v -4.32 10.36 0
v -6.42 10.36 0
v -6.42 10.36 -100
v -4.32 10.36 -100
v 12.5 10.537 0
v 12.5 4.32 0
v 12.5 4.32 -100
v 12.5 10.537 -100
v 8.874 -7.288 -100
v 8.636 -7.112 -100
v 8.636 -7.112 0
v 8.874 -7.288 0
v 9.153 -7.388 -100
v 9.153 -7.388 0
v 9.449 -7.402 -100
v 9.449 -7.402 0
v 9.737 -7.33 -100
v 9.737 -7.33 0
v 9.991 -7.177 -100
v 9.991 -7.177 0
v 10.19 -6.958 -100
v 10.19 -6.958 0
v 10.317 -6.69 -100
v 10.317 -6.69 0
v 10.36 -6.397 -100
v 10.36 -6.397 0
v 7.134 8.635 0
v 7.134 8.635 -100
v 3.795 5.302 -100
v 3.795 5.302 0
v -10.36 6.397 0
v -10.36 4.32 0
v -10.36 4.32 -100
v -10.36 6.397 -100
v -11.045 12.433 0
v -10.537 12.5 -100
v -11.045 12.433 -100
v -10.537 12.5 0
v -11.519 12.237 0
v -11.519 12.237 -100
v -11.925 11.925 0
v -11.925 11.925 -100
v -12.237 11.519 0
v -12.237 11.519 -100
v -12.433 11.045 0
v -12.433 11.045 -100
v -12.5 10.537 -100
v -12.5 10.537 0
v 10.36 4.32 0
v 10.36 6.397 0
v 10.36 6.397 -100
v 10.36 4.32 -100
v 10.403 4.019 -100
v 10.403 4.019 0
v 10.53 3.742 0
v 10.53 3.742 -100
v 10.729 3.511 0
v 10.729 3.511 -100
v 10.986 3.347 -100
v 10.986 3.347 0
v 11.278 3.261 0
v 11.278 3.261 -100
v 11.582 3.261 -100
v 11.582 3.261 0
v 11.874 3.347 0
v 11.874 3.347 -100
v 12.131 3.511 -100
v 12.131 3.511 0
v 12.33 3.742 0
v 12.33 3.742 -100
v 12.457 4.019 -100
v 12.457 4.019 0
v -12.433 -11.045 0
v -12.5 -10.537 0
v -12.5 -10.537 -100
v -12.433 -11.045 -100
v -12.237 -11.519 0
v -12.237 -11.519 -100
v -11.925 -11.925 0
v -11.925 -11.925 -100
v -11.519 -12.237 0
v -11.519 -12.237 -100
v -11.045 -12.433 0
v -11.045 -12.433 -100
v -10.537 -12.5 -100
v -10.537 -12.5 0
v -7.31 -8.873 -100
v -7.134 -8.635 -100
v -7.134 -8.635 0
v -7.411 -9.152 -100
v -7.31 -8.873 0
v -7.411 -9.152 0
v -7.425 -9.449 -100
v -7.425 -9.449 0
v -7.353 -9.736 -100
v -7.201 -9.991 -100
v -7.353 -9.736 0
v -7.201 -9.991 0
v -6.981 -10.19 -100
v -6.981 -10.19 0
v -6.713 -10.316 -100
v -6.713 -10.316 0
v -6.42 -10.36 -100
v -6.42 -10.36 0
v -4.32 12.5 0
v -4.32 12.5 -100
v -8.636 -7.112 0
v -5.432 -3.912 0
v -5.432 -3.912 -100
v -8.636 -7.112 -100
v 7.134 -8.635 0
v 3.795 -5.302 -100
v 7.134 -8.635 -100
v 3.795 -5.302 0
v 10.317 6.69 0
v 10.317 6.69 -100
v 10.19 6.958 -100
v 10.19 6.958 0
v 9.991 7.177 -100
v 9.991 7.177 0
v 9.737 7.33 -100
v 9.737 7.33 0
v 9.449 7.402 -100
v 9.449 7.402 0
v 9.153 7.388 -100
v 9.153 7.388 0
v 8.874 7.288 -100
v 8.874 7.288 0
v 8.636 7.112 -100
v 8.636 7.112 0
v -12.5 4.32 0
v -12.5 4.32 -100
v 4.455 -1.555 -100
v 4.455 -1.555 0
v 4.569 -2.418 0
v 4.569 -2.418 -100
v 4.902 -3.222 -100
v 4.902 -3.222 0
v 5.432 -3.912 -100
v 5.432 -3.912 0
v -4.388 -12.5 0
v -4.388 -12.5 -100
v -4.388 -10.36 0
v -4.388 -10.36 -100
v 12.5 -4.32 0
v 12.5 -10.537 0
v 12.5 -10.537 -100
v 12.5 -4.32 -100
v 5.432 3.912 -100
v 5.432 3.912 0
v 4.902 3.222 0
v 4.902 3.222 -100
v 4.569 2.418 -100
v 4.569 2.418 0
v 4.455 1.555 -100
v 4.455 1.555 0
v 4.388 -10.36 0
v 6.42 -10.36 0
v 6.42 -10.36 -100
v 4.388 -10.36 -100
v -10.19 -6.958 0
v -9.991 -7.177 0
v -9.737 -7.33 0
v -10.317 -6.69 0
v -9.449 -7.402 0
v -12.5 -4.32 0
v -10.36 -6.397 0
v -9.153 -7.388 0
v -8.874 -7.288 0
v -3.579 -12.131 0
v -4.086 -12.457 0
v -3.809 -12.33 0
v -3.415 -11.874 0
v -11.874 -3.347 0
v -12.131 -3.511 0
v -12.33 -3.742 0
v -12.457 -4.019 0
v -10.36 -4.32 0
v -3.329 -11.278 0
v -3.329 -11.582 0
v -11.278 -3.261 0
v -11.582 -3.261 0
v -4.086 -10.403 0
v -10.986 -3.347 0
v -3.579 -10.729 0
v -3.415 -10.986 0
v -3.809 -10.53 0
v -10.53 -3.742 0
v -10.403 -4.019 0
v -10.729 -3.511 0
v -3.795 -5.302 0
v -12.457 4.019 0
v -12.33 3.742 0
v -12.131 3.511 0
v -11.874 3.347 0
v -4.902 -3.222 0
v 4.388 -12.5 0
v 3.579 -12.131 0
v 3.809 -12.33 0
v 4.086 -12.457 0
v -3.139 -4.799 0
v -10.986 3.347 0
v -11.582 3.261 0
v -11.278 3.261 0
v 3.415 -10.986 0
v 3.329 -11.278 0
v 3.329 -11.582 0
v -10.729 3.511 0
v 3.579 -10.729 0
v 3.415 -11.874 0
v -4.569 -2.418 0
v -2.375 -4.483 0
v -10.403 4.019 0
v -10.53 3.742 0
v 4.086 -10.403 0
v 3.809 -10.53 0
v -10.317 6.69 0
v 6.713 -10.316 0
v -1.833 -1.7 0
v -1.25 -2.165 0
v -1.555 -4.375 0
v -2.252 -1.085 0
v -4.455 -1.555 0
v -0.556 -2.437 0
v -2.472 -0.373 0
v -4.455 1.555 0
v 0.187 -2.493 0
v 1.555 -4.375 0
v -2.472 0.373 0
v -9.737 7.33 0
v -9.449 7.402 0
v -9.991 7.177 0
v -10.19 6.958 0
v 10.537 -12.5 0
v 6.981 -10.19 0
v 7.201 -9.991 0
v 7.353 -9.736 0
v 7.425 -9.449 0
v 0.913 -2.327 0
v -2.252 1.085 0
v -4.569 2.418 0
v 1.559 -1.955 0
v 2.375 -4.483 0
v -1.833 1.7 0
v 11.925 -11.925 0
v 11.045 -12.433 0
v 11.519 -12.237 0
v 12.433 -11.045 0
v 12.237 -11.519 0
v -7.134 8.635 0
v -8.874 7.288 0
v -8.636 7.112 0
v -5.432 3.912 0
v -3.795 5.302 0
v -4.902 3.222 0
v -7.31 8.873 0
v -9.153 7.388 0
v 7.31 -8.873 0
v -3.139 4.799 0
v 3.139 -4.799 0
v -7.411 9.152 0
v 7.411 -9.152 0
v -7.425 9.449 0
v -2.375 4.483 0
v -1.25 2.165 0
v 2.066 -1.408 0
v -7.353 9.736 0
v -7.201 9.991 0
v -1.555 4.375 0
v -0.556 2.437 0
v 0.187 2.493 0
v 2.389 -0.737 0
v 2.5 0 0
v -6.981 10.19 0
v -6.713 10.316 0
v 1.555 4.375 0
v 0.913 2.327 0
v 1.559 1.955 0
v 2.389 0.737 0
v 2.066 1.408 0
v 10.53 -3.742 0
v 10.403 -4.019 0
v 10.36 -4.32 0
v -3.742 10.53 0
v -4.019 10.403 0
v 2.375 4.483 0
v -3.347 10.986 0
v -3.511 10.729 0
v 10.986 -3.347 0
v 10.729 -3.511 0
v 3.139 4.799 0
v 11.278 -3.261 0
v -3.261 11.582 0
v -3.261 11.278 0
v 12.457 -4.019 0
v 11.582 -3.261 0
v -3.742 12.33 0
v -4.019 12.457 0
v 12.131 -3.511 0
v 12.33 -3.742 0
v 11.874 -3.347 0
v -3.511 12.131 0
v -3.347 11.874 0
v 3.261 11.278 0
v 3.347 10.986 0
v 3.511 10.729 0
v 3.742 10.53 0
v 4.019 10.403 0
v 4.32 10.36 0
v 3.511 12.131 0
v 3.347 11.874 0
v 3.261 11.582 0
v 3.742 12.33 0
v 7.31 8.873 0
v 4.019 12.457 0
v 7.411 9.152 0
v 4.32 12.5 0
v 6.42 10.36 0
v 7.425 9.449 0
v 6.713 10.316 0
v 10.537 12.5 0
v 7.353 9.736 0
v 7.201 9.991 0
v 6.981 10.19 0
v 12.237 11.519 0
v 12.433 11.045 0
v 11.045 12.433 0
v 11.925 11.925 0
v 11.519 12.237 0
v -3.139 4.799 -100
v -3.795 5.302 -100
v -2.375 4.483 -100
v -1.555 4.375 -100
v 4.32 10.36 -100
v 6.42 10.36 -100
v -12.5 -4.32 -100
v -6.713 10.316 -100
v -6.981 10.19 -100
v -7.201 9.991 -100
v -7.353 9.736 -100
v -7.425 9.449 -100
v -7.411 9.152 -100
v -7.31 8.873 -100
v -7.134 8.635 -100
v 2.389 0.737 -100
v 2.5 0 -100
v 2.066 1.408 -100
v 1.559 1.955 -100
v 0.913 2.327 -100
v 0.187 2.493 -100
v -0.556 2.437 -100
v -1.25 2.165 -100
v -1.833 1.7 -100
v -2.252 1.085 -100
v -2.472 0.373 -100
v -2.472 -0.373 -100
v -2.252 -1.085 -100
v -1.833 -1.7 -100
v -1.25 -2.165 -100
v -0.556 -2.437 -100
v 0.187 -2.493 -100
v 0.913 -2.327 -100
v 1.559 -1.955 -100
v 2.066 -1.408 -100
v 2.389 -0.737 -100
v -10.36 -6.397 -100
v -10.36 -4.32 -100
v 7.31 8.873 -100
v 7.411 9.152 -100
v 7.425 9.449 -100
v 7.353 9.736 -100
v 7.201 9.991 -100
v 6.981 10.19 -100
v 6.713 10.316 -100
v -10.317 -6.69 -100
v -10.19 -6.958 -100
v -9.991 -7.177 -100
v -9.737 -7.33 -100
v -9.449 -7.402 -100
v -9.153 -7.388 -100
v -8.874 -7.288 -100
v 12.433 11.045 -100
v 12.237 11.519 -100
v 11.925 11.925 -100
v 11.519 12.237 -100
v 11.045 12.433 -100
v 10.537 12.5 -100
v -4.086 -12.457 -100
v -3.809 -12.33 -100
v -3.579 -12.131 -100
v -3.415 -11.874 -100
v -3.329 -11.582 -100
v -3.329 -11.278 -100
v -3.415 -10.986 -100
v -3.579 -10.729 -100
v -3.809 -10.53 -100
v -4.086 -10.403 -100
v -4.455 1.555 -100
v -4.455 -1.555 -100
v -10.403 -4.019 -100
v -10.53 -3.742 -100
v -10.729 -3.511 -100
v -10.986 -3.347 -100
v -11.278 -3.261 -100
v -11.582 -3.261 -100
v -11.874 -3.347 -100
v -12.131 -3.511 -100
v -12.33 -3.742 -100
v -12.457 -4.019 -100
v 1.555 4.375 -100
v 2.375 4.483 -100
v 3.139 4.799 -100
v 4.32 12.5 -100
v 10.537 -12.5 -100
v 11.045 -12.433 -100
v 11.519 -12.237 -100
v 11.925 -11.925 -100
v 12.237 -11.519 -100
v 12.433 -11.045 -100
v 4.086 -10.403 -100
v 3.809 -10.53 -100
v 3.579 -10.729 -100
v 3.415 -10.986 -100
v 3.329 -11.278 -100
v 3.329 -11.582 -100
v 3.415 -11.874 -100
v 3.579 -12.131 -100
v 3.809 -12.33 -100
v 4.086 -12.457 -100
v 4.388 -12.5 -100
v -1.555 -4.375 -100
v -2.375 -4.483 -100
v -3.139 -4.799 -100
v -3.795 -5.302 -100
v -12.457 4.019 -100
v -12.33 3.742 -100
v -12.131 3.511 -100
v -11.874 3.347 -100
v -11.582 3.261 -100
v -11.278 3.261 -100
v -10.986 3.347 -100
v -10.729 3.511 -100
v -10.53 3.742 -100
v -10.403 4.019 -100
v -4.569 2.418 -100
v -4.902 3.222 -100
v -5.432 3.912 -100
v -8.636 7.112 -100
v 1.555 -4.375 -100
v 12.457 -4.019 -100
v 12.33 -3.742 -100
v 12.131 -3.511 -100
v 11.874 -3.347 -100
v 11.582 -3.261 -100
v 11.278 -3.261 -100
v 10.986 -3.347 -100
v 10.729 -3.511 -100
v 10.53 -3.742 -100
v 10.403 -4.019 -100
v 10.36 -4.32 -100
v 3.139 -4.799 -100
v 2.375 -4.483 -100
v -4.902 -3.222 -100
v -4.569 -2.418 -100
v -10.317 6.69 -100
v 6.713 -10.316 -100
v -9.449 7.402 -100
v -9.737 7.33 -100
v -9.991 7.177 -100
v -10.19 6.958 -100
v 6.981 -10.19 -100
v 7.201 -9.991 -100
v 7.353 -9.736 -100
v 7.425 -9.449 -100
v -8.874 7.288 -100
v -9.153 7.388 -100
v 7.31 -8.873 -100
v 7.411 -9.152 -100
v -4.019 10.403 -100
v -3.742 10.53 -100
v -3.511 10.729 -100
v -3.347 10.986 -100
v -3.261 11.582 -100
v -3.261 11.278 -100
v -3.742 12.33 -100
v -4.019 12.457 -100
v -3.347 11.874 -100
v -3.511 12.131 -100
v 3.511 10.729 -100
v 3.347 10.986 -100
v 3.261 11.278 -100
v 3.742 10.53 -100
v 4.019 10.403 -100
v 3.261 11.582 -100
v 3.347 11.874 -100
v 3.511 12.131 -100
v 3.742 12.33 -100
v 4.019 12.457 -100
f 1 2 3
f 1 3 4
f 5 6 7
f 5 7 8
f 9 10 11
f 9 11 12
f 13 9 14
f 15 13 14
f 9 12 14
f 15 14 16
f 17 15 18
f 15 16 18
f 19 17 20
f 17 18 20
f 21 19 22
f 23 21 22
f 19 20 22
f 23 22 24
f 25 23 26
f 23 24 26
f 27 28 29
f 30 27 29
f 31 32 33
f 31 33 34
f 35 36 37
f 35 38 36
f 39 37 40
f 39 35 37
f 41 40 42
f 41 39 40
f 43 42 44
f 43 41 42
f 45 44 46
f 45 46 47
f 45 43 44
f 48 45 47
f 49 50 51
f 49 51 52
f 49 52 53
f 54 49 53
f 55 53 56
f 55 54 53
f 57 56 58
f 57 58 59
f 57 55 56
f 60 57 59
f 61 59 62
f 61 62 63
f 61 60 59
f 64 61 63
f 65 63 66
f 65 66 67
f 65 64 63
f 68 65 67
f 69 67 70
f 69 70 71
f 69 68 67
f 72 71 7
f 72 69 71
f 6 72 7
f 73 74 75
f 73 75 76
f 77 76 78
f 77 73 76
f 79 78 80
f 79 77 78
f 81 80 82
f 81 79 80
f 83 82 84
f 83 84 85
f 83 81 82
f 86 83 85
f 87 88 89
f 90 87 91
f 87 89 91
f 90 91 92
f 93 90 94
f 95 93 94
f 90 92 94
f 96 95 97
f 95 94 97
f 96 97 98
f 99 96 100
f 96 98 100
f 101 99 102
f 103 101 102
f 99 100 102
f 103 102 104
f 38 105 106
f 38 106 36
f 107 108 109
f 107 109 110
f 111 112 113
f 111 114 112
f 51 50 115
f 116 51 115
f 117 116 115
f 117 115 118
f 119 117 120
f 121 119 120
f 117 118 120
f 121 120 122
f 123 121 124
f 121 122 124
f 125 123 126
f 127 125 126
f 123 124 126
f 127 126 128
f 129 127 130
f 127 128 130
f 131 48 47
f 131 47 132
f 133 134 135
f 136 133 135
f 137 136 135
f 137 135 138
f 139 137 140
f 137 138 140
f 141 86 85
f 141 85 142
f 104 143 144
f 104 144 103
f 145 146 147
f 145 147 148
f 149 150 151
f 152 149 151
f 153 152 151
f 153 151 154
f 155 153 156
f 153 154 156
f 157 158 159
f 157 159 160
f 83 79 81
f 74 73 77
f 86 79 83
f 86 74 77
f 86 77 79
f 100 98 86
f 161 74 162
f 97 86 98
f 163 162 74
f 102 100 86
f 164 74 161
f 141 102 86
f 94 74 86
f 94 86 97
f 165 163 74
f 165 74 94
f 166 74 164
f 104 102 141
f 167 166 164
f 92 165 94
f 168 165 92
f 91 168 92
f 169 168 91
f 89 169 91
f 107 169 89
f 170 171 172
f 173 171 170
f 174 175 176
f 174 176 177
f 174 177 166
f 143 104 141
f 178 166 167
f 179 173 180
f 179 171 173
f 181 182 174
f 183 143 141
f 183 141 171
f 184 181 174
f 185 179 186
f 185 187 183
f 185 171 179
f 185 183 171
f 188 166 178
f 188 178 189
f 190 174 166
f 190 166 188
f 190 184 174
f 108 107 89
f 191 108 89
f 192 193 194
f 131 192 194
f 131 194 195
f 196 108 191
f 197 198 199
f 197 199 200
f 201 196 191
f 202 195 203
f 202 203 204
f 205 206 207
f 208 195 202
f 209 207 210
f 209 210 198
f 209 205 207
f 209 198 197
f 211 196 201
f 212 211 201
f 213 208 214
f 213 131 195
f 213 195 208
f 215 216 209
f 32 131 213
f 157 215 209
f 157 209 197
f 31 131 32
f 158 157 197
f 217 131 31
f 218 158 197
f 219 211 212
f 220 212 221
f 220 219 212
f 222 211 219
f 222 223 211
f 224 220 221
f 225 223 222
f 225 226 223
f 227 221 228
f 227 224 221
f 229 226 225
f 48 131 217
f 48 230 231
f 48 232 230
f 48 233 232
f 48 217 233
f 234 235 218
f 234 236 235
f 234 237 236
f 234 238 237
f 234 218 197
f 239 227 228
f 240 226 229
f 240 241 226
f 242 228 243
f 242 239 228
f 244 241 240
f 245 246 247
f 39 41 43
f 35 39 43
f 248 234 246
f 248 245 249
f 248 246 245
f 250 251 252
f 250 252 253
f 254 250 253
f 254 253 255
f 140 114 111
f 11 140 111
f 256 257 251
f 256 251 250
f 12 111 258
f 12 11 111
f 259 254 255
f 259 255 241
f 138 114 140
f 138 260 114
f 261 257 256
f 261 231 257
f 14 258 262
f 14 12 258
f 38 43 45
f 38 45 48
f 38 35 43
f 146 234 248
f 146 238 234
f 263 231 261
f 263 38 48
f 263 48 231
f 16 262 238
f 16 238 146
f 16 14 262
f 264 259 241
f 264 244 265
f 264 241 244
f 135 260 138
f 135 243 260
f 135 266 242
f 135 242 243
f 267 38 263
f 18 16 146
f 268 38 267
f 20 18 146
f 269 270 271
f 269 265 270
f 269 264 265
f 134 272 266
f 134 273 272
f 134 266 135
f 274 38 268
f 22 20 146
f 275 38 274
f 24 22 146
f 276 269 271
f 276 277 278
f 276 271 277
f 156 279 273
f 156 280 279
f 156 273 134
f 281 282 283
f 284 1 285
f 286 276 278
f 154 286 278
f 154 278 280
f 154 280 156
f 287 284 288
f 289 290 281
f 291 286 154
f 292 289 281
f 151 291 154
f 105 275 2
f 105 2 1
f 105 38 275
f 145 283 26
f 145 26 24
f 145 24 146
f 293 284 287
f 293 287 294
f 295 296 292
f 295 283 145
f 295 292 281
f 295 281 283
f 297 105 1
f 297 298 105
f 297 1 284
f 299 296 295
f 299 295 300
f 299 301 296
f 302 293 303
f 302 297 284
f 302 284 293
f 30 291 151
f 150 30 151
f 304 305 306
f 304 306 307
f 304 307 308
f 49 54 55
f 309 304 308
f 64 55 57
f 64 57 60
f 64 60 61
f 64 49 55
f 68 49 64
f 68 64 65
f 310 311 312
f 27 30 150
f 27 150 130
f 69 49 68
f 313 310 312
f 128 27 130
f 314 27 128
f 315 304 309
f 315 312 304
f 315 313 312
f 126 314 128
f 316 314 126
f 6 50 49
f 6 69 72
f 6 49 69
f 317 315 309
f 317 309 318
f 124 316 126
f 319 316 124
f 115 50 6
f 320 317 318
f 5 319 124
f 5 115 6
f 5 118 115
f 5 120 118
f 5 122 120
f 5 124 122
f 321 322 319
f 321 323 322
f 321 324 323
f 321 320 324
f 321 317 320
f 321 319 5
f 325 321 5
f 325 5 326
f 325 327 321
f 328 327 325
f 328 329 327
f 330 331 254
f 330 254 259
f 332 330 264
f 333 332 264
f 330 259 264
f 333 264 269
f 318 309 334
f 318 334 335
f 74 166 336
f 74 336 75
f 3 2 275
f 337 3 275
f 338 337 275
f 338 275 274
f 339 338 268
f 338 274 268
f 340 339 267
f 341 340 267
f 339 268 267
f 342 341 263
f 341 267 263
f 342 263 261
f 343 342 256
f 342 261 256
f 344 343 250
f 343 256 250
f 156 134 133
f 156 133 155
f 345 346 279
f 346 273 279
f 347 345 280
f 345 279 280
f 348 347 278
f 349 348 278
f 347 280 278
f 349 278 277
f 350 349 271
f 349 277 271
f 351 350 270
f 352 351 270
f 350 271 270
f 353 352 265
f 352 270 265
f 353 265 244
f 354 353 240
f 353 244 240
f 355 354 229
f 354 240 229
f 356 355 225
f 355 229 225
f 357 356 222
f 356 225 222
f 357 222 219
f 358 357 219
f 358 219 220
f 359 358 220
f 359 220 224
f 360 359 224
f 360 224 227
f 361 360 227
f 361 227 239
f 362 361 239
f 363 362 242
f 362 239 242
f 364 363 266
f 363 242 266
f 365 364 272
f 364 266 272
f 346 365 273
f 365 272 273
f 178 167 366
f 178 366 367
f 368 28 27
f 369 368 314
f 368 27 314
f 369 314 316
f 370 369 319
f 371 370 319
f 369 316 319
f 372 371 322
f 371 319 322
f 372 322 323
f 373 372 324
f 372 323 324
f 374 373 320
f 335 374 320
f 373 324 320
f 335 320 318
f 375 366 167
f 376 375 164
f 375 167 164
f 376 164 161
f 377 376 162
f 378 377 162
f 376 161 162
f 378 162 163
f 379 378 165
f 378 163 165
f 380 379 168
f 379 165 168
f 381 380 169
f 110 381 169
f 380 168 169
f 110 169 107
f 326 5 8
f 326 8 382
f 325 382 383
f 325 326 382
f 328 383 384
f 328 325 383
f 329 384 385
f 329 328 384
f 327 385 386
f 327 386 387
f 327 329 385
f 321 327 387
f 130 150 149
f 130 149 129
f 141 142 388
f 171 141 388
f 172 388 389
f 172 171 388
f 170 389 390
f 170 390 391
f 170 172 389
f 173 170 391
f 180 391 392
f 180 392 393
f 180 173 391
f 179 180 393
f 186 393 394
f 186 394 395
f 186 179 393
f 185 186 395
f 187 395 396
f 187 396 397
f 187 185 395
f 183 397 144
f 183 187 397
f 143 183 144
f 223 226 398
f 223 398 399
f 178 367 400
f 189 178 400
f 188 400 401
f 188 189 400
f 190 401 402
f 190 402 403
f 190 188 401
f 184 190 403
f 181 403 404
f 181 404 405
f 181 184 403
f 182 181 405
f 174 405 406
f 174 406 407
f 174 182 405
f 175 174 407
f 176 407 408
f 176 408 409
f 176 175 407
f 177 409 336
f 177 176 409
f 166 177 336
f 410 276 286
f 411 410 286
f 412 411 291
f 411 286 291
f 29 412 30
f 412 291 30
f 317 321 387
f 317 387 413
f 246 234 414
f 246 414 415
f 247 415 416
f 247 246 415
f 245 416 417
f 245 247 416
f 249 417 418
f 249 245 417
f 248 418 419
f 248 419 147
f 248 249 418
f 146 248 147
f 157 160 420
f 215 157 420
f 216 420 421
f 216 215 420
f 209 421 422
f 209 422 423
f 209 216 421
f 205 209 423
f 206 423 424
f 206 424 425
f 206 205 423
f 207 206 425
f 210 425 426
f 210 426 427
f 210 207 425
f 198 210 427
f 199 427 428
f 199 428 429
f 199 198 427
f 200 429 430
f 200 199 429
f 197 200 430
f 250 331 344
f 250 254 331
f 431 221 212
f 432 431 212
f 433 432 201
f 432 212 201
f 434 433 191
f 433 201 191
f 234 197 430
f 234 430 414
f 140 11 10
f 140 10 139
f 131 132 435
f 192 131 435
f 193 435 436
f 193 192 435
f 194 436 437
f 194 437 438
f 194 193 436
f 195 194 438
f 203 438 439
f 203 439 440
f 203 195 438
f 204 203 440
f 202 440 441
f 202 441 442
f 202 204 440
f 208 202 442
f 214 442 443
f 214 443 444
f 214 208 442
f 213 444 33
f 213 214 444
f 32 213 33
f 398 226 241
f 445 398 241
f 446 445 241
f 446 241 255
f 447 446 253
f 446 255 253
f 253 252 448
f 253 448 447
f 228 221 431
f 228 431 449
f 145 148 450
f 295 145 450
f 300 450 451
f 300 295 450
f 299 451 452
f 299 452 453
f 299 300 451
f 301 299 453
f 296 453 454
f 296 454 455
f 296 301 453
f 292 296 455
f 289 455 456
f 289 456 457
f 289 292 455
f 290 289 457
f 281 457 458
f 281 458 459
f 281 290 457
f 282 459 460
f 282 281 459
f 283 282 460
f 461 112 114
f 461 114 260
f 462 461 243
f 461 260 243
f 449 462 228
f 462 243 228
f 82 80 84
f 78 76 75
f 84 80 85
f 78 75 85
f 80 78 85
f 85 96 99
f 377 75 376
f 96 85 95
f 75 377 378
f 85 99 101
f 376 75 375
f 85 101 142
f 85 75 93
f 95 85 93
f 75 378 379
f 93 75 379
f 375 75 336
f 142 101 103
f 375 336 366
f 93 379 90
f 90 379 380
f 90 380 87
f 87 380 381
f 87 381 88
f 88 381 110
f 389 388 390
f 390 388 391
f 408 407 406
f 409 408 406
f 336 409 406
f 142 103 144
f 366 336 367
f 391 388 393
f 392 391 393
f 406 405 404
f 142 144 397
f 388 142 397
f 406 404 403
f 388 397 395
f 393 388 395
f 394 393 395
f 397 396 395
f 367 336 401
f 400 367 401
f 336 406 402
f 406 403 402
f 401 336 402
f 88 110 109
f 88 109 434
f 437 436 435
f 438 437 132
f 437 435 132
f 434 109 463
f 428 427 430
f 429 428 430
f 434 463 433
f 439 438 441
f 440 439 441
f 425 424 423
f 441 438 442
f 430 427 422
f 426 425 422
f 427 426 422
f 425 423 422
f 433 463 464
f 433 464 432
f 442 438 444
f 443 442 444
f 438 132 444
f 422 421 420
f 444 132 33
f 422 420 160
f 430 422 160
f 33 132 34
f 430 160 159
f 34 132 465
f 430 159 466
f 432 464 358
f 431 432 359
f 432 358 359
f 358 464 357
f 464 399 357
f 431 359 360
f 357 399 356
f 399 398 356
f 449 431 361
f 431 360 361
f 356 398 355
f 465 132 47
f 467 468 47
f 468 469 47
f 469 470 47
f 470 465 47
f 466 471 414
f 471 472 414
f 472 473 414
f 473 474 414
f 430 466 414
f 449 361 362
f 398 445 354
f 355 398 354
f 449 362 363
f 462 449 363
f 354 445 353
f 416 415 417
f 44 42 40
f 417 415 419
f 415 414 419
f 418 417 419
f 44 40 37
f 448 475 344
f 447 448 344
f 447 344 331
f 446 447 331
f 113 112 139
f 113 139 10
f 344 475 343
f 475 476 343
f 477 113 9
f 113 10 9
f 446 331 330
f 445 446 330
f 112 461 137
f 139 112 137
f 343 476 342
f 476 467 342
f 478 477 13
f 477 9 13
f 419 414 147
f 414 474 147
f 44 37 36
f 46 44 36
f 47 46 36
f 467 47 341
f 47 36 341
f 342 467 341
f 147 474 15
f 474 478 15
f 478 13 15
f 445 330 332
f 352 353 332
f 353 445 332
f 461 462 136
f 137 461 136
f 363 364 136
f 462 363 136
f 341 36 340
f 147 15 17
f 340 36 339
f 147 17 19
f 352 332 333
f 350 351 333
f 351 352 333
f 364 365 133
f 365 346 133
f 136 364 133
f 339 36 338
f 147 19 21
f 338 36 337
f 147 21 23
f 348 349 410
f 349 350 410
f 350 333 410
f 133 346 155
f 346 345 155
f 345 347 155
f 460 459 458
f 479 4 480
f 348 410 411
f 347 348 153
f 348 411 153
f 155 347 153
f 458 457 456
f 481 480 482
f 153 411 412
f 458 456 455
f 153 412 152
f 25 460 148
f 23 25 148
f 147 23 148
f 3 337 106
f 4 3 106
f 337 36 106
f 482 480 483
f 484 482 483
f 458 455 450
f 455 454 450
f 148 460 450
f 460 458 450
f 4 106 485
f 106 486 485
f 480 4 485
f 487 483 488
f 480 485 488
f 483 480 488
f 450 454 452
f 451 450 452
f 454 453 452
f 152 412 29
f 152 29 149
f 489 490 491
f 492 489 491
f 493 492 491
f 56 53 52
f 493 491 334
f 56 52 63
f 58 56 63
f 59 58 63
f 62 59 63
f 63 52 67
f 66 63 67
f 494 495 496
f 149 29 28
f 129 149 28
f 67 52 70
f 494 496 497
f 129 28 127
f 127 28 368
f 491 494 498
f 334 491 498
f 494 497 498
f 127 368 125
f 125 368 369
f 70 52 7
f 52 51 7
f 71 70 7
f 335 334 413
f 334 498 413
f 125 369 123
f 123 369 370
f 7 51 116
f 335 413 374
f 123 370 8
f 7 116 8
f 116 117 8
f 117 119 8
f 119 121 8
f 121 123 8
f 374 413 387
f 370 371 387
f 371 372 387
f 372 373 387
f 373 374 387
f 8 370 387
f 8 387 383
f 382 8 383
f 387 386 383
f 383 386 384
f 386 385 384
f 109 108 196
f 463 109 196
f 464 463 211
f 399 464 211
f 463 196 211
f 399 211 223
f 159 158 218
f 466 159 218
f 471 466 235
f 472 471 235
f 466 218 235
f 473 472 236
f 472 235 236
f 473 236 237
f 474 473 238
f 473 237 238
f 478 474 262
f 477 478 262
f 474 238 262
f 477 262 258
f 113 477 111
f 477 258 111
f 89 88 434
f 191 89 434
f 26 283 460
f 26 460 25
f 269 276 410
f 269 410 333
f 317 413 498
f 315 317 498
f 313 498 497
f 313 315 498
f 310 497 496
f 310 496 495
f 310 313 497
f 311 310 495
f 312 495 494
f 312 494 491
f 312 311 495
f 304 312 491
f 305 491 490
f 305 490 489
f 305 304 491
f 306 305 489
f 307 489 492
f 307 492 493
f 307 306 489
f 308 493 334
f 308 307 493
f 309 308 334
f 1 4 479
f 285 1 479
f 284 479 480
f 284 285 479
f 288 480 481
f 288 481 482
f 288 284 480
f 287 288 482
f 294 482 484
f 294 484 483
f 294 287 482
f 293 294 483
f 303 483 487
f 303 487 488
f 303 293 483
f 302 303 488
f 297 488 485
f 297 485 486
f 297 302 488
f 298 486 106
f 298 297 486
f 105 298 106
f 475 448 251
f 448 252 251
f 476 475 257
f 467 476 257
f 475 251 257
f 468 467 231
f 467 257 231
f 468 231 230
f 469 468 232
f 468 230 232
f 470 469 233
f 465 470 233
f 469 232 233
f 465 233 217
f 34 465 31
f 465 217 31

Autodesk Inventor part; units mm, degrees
ref_plane "YZ Plane" through (0, 0, 0) normal (1, 0, 0) x (0, 1, 0)
ref_plane "XZ Plane" through (0, 0, 0) normal (0, 1, 0) x (-1, 0, 0)
ref_plane "XY Plane" through (0, 0, 0) normal (0, 0, 1) x (1, 0, 0)
sketch "Sketch1" plane through (0, 0, 0) normal (0, 0, 1) x (1, 0, 0)
  circle A0 centre (0, 0) radius 2.5
  arc A1 (-8.6363, 7.1116) -> (-10.36, 6.3969) centre (-9.35, 6.3969) ccw
  line L0 (-8.6363, 7.1116) -> (-5.4322, 3.9121)
  arc A2 (-4.455, 1.5554) -> (-5.4322, 3.9121) centre (-7.7855, 1.5554) ccw
  line L1 (-4.455, 1.5554) -> (-4.455, -1.5554)
  arc A3 (-5.4322, -3.9121) -> (-4.455, -1.5554) centre (-7.7855, -1.5554) ccw
  line L2 (-5.4322, -3.9121) -> (-8.6363, -7.1116)
  arc A4 (-10.36, -6.3969) -> (-8.6363, -7.1116) centre (-9.35, -6.3969) ccw
  line L3 (-10.36, -6.3969) -> (-10.36, -4.32)
  arc A5 (-10.36, -4.32) -> (-12.5, -4.32) centre (-11.43, -4.32) ccw
  line L4 (-12.5, -4.32) -> (-12.5, -10.5371)
  arc A6 (-12.5, -10.5371) -> (-10.5371, -12.5) centre (-10.5371, -10.5371) ccw
  line L5 (-10.5371, -12.5) -> (-4.3879, -12.5)
  arc A7 (-4.3879, -12.5) -> (-4.3879, -10.36) centre (-4.3879, -11.43) ccw
  line L6 (-4.3879, -10.36) -> (-6.42, -10.36)
  arc A8 (-7.1337, -8.6353) -> (-6.42, -10.36) centre (-6.42, -9.35) ccw
  line L7 (-7.1337, -8.6353) -> (-3.7953, -5.3018)
  arc A9 (-1.5554, -4.375) -> (-3.7953, -5.3018) centre (-1.5554, -7.545) ccw
  line L8 (-1.5554, -4.375) -> (1.5554, -4.375)
  arc A10 (3.7953, -5.3018) -> (1.5554, -4.375) centre (1.5554, -7.545) ccw
  line L9 (3.7953, -5.3018) -> (7.1337, -8.6353)
  arc A11 (6.42, -10.36) -> (7.1337, -8.6353) centre (6.42, -9.35) ccw
  line L10 (6.42, -10.36) -> (4.3879, -10.36)
  arc A12 (4.3879, -10.36) -> (4.3879, -12.5) centre (4.3879, -11.43) ccw
  line L11 (4.3879, -12.5) -> (10.5371, -12.5)
  arc A13 (10.5371, -12.5) -> (12.5, -10.5371) centre (10.5371, -10.5371) ccw
  line L12 (12.5, -10.5371) -> (12.5, -4.32)
  arc A14 (12.5, -4.32) -> (10.36, -4.32) centre (11.43, -4.32) ccw
  line L13 (10.36, -4.32) -> (10.36, -6.3969)
  arc A15 (8.6363, -7.1116) -> (10.36, -6.3969) centre (9.35, -6.3969) ccw
  line L14 (8.6363, -7.1116) -> (5.4322, -3.9121)
  arc A16 (4.455, -1.5554) -> (5.4322, -3.9121) centre (7.7855, -1.5554) ccw
  line L15 (4.455, -1.5554) -> (4.455, 1.5554)
  arc A17 (5.4322, 3.9121) -> (4.455, 1.5554) centre (7.7855, 1.5554) ccw
  line L16 (5.4322, 3.9121) -> (8.6363, 7.1116)
  arc A18 (10.36, 6.3969) -> (8.6363, 7.1116) centre (9.35, 6.3969) ccw
  line L17 (10.36, 6.3969) -> (10.36, 4.32)
  arc A19 (10.36, 4.32) -> (12.5, 4.32) centre (11.43, 4.32) ccw
  line L18 (12.5, 4.32) -> (12.5, 10.5371)
  arc A20 (12.5, 10.5371) -> (10.5371, 12.5) centre (10.5371, 10.5371) ccw
  line L19 (10.5371, 12.5) -> (4.32, 12.5)
  arc A21 (4.32, 12.5) -> (4.32, 10.36) centre (4.32, 11.43) ccw
  line L20 (4.32, 10.36) -> (6.42, 10.36)
  arc A22 (7.1337, 8.6353) -> (6.42, 10.36) centre (6.42, 9.35) ccw
  line L21 (7.1337, 8.6353) -> (3.7953, 5.3018)
  arc A23 (1.5554, 4.375) -> (3.7953, 5.3018) centre (1.5554, 7.545) ccw
  line L22 (1.5554, 4.375) -> (-1.5554, 4.375)
  arc A24 (-3.7953, 5.3018) -> (-1.5554, 4.375) centre (-1.5554, 7.545) ccw
  line L23 (-3.7953, 5.3018) -> (-7.1337, 8.6353)
  arc A25 (-6.42, 10.36) -> (-7.1337, 8.6353) centre (-6.42, 9.35) ccw
  line L24 (-6.42, 10.36) -> (-4.32, 10.36)
  arc A26 (-4.32, 10.36) -> (-4.32, 12.5) centre (-4.32, 11.43) ccw
  line L25 (-4.32, 12.5) -> (-10.5371, 12.5)
  arc A27 (-10.5371, 12.5) -> (-12.5, 10.5371) centre (-10.5371, 10.5371) ccw
  line L26 (-12.5, 10.5371) -> (-12.5, 4.32)
  arc A28 (-12.5, 4.32) -> (-10.36, 4.32) centre (-11.43, 4.32) ccw
  line L27 (-10.36, 4.32) -> (-10.36, 6.3969)
extrude "Extrusion1" add sketch "Sketch1" against normal blind 100
properties part number "25-2525"
